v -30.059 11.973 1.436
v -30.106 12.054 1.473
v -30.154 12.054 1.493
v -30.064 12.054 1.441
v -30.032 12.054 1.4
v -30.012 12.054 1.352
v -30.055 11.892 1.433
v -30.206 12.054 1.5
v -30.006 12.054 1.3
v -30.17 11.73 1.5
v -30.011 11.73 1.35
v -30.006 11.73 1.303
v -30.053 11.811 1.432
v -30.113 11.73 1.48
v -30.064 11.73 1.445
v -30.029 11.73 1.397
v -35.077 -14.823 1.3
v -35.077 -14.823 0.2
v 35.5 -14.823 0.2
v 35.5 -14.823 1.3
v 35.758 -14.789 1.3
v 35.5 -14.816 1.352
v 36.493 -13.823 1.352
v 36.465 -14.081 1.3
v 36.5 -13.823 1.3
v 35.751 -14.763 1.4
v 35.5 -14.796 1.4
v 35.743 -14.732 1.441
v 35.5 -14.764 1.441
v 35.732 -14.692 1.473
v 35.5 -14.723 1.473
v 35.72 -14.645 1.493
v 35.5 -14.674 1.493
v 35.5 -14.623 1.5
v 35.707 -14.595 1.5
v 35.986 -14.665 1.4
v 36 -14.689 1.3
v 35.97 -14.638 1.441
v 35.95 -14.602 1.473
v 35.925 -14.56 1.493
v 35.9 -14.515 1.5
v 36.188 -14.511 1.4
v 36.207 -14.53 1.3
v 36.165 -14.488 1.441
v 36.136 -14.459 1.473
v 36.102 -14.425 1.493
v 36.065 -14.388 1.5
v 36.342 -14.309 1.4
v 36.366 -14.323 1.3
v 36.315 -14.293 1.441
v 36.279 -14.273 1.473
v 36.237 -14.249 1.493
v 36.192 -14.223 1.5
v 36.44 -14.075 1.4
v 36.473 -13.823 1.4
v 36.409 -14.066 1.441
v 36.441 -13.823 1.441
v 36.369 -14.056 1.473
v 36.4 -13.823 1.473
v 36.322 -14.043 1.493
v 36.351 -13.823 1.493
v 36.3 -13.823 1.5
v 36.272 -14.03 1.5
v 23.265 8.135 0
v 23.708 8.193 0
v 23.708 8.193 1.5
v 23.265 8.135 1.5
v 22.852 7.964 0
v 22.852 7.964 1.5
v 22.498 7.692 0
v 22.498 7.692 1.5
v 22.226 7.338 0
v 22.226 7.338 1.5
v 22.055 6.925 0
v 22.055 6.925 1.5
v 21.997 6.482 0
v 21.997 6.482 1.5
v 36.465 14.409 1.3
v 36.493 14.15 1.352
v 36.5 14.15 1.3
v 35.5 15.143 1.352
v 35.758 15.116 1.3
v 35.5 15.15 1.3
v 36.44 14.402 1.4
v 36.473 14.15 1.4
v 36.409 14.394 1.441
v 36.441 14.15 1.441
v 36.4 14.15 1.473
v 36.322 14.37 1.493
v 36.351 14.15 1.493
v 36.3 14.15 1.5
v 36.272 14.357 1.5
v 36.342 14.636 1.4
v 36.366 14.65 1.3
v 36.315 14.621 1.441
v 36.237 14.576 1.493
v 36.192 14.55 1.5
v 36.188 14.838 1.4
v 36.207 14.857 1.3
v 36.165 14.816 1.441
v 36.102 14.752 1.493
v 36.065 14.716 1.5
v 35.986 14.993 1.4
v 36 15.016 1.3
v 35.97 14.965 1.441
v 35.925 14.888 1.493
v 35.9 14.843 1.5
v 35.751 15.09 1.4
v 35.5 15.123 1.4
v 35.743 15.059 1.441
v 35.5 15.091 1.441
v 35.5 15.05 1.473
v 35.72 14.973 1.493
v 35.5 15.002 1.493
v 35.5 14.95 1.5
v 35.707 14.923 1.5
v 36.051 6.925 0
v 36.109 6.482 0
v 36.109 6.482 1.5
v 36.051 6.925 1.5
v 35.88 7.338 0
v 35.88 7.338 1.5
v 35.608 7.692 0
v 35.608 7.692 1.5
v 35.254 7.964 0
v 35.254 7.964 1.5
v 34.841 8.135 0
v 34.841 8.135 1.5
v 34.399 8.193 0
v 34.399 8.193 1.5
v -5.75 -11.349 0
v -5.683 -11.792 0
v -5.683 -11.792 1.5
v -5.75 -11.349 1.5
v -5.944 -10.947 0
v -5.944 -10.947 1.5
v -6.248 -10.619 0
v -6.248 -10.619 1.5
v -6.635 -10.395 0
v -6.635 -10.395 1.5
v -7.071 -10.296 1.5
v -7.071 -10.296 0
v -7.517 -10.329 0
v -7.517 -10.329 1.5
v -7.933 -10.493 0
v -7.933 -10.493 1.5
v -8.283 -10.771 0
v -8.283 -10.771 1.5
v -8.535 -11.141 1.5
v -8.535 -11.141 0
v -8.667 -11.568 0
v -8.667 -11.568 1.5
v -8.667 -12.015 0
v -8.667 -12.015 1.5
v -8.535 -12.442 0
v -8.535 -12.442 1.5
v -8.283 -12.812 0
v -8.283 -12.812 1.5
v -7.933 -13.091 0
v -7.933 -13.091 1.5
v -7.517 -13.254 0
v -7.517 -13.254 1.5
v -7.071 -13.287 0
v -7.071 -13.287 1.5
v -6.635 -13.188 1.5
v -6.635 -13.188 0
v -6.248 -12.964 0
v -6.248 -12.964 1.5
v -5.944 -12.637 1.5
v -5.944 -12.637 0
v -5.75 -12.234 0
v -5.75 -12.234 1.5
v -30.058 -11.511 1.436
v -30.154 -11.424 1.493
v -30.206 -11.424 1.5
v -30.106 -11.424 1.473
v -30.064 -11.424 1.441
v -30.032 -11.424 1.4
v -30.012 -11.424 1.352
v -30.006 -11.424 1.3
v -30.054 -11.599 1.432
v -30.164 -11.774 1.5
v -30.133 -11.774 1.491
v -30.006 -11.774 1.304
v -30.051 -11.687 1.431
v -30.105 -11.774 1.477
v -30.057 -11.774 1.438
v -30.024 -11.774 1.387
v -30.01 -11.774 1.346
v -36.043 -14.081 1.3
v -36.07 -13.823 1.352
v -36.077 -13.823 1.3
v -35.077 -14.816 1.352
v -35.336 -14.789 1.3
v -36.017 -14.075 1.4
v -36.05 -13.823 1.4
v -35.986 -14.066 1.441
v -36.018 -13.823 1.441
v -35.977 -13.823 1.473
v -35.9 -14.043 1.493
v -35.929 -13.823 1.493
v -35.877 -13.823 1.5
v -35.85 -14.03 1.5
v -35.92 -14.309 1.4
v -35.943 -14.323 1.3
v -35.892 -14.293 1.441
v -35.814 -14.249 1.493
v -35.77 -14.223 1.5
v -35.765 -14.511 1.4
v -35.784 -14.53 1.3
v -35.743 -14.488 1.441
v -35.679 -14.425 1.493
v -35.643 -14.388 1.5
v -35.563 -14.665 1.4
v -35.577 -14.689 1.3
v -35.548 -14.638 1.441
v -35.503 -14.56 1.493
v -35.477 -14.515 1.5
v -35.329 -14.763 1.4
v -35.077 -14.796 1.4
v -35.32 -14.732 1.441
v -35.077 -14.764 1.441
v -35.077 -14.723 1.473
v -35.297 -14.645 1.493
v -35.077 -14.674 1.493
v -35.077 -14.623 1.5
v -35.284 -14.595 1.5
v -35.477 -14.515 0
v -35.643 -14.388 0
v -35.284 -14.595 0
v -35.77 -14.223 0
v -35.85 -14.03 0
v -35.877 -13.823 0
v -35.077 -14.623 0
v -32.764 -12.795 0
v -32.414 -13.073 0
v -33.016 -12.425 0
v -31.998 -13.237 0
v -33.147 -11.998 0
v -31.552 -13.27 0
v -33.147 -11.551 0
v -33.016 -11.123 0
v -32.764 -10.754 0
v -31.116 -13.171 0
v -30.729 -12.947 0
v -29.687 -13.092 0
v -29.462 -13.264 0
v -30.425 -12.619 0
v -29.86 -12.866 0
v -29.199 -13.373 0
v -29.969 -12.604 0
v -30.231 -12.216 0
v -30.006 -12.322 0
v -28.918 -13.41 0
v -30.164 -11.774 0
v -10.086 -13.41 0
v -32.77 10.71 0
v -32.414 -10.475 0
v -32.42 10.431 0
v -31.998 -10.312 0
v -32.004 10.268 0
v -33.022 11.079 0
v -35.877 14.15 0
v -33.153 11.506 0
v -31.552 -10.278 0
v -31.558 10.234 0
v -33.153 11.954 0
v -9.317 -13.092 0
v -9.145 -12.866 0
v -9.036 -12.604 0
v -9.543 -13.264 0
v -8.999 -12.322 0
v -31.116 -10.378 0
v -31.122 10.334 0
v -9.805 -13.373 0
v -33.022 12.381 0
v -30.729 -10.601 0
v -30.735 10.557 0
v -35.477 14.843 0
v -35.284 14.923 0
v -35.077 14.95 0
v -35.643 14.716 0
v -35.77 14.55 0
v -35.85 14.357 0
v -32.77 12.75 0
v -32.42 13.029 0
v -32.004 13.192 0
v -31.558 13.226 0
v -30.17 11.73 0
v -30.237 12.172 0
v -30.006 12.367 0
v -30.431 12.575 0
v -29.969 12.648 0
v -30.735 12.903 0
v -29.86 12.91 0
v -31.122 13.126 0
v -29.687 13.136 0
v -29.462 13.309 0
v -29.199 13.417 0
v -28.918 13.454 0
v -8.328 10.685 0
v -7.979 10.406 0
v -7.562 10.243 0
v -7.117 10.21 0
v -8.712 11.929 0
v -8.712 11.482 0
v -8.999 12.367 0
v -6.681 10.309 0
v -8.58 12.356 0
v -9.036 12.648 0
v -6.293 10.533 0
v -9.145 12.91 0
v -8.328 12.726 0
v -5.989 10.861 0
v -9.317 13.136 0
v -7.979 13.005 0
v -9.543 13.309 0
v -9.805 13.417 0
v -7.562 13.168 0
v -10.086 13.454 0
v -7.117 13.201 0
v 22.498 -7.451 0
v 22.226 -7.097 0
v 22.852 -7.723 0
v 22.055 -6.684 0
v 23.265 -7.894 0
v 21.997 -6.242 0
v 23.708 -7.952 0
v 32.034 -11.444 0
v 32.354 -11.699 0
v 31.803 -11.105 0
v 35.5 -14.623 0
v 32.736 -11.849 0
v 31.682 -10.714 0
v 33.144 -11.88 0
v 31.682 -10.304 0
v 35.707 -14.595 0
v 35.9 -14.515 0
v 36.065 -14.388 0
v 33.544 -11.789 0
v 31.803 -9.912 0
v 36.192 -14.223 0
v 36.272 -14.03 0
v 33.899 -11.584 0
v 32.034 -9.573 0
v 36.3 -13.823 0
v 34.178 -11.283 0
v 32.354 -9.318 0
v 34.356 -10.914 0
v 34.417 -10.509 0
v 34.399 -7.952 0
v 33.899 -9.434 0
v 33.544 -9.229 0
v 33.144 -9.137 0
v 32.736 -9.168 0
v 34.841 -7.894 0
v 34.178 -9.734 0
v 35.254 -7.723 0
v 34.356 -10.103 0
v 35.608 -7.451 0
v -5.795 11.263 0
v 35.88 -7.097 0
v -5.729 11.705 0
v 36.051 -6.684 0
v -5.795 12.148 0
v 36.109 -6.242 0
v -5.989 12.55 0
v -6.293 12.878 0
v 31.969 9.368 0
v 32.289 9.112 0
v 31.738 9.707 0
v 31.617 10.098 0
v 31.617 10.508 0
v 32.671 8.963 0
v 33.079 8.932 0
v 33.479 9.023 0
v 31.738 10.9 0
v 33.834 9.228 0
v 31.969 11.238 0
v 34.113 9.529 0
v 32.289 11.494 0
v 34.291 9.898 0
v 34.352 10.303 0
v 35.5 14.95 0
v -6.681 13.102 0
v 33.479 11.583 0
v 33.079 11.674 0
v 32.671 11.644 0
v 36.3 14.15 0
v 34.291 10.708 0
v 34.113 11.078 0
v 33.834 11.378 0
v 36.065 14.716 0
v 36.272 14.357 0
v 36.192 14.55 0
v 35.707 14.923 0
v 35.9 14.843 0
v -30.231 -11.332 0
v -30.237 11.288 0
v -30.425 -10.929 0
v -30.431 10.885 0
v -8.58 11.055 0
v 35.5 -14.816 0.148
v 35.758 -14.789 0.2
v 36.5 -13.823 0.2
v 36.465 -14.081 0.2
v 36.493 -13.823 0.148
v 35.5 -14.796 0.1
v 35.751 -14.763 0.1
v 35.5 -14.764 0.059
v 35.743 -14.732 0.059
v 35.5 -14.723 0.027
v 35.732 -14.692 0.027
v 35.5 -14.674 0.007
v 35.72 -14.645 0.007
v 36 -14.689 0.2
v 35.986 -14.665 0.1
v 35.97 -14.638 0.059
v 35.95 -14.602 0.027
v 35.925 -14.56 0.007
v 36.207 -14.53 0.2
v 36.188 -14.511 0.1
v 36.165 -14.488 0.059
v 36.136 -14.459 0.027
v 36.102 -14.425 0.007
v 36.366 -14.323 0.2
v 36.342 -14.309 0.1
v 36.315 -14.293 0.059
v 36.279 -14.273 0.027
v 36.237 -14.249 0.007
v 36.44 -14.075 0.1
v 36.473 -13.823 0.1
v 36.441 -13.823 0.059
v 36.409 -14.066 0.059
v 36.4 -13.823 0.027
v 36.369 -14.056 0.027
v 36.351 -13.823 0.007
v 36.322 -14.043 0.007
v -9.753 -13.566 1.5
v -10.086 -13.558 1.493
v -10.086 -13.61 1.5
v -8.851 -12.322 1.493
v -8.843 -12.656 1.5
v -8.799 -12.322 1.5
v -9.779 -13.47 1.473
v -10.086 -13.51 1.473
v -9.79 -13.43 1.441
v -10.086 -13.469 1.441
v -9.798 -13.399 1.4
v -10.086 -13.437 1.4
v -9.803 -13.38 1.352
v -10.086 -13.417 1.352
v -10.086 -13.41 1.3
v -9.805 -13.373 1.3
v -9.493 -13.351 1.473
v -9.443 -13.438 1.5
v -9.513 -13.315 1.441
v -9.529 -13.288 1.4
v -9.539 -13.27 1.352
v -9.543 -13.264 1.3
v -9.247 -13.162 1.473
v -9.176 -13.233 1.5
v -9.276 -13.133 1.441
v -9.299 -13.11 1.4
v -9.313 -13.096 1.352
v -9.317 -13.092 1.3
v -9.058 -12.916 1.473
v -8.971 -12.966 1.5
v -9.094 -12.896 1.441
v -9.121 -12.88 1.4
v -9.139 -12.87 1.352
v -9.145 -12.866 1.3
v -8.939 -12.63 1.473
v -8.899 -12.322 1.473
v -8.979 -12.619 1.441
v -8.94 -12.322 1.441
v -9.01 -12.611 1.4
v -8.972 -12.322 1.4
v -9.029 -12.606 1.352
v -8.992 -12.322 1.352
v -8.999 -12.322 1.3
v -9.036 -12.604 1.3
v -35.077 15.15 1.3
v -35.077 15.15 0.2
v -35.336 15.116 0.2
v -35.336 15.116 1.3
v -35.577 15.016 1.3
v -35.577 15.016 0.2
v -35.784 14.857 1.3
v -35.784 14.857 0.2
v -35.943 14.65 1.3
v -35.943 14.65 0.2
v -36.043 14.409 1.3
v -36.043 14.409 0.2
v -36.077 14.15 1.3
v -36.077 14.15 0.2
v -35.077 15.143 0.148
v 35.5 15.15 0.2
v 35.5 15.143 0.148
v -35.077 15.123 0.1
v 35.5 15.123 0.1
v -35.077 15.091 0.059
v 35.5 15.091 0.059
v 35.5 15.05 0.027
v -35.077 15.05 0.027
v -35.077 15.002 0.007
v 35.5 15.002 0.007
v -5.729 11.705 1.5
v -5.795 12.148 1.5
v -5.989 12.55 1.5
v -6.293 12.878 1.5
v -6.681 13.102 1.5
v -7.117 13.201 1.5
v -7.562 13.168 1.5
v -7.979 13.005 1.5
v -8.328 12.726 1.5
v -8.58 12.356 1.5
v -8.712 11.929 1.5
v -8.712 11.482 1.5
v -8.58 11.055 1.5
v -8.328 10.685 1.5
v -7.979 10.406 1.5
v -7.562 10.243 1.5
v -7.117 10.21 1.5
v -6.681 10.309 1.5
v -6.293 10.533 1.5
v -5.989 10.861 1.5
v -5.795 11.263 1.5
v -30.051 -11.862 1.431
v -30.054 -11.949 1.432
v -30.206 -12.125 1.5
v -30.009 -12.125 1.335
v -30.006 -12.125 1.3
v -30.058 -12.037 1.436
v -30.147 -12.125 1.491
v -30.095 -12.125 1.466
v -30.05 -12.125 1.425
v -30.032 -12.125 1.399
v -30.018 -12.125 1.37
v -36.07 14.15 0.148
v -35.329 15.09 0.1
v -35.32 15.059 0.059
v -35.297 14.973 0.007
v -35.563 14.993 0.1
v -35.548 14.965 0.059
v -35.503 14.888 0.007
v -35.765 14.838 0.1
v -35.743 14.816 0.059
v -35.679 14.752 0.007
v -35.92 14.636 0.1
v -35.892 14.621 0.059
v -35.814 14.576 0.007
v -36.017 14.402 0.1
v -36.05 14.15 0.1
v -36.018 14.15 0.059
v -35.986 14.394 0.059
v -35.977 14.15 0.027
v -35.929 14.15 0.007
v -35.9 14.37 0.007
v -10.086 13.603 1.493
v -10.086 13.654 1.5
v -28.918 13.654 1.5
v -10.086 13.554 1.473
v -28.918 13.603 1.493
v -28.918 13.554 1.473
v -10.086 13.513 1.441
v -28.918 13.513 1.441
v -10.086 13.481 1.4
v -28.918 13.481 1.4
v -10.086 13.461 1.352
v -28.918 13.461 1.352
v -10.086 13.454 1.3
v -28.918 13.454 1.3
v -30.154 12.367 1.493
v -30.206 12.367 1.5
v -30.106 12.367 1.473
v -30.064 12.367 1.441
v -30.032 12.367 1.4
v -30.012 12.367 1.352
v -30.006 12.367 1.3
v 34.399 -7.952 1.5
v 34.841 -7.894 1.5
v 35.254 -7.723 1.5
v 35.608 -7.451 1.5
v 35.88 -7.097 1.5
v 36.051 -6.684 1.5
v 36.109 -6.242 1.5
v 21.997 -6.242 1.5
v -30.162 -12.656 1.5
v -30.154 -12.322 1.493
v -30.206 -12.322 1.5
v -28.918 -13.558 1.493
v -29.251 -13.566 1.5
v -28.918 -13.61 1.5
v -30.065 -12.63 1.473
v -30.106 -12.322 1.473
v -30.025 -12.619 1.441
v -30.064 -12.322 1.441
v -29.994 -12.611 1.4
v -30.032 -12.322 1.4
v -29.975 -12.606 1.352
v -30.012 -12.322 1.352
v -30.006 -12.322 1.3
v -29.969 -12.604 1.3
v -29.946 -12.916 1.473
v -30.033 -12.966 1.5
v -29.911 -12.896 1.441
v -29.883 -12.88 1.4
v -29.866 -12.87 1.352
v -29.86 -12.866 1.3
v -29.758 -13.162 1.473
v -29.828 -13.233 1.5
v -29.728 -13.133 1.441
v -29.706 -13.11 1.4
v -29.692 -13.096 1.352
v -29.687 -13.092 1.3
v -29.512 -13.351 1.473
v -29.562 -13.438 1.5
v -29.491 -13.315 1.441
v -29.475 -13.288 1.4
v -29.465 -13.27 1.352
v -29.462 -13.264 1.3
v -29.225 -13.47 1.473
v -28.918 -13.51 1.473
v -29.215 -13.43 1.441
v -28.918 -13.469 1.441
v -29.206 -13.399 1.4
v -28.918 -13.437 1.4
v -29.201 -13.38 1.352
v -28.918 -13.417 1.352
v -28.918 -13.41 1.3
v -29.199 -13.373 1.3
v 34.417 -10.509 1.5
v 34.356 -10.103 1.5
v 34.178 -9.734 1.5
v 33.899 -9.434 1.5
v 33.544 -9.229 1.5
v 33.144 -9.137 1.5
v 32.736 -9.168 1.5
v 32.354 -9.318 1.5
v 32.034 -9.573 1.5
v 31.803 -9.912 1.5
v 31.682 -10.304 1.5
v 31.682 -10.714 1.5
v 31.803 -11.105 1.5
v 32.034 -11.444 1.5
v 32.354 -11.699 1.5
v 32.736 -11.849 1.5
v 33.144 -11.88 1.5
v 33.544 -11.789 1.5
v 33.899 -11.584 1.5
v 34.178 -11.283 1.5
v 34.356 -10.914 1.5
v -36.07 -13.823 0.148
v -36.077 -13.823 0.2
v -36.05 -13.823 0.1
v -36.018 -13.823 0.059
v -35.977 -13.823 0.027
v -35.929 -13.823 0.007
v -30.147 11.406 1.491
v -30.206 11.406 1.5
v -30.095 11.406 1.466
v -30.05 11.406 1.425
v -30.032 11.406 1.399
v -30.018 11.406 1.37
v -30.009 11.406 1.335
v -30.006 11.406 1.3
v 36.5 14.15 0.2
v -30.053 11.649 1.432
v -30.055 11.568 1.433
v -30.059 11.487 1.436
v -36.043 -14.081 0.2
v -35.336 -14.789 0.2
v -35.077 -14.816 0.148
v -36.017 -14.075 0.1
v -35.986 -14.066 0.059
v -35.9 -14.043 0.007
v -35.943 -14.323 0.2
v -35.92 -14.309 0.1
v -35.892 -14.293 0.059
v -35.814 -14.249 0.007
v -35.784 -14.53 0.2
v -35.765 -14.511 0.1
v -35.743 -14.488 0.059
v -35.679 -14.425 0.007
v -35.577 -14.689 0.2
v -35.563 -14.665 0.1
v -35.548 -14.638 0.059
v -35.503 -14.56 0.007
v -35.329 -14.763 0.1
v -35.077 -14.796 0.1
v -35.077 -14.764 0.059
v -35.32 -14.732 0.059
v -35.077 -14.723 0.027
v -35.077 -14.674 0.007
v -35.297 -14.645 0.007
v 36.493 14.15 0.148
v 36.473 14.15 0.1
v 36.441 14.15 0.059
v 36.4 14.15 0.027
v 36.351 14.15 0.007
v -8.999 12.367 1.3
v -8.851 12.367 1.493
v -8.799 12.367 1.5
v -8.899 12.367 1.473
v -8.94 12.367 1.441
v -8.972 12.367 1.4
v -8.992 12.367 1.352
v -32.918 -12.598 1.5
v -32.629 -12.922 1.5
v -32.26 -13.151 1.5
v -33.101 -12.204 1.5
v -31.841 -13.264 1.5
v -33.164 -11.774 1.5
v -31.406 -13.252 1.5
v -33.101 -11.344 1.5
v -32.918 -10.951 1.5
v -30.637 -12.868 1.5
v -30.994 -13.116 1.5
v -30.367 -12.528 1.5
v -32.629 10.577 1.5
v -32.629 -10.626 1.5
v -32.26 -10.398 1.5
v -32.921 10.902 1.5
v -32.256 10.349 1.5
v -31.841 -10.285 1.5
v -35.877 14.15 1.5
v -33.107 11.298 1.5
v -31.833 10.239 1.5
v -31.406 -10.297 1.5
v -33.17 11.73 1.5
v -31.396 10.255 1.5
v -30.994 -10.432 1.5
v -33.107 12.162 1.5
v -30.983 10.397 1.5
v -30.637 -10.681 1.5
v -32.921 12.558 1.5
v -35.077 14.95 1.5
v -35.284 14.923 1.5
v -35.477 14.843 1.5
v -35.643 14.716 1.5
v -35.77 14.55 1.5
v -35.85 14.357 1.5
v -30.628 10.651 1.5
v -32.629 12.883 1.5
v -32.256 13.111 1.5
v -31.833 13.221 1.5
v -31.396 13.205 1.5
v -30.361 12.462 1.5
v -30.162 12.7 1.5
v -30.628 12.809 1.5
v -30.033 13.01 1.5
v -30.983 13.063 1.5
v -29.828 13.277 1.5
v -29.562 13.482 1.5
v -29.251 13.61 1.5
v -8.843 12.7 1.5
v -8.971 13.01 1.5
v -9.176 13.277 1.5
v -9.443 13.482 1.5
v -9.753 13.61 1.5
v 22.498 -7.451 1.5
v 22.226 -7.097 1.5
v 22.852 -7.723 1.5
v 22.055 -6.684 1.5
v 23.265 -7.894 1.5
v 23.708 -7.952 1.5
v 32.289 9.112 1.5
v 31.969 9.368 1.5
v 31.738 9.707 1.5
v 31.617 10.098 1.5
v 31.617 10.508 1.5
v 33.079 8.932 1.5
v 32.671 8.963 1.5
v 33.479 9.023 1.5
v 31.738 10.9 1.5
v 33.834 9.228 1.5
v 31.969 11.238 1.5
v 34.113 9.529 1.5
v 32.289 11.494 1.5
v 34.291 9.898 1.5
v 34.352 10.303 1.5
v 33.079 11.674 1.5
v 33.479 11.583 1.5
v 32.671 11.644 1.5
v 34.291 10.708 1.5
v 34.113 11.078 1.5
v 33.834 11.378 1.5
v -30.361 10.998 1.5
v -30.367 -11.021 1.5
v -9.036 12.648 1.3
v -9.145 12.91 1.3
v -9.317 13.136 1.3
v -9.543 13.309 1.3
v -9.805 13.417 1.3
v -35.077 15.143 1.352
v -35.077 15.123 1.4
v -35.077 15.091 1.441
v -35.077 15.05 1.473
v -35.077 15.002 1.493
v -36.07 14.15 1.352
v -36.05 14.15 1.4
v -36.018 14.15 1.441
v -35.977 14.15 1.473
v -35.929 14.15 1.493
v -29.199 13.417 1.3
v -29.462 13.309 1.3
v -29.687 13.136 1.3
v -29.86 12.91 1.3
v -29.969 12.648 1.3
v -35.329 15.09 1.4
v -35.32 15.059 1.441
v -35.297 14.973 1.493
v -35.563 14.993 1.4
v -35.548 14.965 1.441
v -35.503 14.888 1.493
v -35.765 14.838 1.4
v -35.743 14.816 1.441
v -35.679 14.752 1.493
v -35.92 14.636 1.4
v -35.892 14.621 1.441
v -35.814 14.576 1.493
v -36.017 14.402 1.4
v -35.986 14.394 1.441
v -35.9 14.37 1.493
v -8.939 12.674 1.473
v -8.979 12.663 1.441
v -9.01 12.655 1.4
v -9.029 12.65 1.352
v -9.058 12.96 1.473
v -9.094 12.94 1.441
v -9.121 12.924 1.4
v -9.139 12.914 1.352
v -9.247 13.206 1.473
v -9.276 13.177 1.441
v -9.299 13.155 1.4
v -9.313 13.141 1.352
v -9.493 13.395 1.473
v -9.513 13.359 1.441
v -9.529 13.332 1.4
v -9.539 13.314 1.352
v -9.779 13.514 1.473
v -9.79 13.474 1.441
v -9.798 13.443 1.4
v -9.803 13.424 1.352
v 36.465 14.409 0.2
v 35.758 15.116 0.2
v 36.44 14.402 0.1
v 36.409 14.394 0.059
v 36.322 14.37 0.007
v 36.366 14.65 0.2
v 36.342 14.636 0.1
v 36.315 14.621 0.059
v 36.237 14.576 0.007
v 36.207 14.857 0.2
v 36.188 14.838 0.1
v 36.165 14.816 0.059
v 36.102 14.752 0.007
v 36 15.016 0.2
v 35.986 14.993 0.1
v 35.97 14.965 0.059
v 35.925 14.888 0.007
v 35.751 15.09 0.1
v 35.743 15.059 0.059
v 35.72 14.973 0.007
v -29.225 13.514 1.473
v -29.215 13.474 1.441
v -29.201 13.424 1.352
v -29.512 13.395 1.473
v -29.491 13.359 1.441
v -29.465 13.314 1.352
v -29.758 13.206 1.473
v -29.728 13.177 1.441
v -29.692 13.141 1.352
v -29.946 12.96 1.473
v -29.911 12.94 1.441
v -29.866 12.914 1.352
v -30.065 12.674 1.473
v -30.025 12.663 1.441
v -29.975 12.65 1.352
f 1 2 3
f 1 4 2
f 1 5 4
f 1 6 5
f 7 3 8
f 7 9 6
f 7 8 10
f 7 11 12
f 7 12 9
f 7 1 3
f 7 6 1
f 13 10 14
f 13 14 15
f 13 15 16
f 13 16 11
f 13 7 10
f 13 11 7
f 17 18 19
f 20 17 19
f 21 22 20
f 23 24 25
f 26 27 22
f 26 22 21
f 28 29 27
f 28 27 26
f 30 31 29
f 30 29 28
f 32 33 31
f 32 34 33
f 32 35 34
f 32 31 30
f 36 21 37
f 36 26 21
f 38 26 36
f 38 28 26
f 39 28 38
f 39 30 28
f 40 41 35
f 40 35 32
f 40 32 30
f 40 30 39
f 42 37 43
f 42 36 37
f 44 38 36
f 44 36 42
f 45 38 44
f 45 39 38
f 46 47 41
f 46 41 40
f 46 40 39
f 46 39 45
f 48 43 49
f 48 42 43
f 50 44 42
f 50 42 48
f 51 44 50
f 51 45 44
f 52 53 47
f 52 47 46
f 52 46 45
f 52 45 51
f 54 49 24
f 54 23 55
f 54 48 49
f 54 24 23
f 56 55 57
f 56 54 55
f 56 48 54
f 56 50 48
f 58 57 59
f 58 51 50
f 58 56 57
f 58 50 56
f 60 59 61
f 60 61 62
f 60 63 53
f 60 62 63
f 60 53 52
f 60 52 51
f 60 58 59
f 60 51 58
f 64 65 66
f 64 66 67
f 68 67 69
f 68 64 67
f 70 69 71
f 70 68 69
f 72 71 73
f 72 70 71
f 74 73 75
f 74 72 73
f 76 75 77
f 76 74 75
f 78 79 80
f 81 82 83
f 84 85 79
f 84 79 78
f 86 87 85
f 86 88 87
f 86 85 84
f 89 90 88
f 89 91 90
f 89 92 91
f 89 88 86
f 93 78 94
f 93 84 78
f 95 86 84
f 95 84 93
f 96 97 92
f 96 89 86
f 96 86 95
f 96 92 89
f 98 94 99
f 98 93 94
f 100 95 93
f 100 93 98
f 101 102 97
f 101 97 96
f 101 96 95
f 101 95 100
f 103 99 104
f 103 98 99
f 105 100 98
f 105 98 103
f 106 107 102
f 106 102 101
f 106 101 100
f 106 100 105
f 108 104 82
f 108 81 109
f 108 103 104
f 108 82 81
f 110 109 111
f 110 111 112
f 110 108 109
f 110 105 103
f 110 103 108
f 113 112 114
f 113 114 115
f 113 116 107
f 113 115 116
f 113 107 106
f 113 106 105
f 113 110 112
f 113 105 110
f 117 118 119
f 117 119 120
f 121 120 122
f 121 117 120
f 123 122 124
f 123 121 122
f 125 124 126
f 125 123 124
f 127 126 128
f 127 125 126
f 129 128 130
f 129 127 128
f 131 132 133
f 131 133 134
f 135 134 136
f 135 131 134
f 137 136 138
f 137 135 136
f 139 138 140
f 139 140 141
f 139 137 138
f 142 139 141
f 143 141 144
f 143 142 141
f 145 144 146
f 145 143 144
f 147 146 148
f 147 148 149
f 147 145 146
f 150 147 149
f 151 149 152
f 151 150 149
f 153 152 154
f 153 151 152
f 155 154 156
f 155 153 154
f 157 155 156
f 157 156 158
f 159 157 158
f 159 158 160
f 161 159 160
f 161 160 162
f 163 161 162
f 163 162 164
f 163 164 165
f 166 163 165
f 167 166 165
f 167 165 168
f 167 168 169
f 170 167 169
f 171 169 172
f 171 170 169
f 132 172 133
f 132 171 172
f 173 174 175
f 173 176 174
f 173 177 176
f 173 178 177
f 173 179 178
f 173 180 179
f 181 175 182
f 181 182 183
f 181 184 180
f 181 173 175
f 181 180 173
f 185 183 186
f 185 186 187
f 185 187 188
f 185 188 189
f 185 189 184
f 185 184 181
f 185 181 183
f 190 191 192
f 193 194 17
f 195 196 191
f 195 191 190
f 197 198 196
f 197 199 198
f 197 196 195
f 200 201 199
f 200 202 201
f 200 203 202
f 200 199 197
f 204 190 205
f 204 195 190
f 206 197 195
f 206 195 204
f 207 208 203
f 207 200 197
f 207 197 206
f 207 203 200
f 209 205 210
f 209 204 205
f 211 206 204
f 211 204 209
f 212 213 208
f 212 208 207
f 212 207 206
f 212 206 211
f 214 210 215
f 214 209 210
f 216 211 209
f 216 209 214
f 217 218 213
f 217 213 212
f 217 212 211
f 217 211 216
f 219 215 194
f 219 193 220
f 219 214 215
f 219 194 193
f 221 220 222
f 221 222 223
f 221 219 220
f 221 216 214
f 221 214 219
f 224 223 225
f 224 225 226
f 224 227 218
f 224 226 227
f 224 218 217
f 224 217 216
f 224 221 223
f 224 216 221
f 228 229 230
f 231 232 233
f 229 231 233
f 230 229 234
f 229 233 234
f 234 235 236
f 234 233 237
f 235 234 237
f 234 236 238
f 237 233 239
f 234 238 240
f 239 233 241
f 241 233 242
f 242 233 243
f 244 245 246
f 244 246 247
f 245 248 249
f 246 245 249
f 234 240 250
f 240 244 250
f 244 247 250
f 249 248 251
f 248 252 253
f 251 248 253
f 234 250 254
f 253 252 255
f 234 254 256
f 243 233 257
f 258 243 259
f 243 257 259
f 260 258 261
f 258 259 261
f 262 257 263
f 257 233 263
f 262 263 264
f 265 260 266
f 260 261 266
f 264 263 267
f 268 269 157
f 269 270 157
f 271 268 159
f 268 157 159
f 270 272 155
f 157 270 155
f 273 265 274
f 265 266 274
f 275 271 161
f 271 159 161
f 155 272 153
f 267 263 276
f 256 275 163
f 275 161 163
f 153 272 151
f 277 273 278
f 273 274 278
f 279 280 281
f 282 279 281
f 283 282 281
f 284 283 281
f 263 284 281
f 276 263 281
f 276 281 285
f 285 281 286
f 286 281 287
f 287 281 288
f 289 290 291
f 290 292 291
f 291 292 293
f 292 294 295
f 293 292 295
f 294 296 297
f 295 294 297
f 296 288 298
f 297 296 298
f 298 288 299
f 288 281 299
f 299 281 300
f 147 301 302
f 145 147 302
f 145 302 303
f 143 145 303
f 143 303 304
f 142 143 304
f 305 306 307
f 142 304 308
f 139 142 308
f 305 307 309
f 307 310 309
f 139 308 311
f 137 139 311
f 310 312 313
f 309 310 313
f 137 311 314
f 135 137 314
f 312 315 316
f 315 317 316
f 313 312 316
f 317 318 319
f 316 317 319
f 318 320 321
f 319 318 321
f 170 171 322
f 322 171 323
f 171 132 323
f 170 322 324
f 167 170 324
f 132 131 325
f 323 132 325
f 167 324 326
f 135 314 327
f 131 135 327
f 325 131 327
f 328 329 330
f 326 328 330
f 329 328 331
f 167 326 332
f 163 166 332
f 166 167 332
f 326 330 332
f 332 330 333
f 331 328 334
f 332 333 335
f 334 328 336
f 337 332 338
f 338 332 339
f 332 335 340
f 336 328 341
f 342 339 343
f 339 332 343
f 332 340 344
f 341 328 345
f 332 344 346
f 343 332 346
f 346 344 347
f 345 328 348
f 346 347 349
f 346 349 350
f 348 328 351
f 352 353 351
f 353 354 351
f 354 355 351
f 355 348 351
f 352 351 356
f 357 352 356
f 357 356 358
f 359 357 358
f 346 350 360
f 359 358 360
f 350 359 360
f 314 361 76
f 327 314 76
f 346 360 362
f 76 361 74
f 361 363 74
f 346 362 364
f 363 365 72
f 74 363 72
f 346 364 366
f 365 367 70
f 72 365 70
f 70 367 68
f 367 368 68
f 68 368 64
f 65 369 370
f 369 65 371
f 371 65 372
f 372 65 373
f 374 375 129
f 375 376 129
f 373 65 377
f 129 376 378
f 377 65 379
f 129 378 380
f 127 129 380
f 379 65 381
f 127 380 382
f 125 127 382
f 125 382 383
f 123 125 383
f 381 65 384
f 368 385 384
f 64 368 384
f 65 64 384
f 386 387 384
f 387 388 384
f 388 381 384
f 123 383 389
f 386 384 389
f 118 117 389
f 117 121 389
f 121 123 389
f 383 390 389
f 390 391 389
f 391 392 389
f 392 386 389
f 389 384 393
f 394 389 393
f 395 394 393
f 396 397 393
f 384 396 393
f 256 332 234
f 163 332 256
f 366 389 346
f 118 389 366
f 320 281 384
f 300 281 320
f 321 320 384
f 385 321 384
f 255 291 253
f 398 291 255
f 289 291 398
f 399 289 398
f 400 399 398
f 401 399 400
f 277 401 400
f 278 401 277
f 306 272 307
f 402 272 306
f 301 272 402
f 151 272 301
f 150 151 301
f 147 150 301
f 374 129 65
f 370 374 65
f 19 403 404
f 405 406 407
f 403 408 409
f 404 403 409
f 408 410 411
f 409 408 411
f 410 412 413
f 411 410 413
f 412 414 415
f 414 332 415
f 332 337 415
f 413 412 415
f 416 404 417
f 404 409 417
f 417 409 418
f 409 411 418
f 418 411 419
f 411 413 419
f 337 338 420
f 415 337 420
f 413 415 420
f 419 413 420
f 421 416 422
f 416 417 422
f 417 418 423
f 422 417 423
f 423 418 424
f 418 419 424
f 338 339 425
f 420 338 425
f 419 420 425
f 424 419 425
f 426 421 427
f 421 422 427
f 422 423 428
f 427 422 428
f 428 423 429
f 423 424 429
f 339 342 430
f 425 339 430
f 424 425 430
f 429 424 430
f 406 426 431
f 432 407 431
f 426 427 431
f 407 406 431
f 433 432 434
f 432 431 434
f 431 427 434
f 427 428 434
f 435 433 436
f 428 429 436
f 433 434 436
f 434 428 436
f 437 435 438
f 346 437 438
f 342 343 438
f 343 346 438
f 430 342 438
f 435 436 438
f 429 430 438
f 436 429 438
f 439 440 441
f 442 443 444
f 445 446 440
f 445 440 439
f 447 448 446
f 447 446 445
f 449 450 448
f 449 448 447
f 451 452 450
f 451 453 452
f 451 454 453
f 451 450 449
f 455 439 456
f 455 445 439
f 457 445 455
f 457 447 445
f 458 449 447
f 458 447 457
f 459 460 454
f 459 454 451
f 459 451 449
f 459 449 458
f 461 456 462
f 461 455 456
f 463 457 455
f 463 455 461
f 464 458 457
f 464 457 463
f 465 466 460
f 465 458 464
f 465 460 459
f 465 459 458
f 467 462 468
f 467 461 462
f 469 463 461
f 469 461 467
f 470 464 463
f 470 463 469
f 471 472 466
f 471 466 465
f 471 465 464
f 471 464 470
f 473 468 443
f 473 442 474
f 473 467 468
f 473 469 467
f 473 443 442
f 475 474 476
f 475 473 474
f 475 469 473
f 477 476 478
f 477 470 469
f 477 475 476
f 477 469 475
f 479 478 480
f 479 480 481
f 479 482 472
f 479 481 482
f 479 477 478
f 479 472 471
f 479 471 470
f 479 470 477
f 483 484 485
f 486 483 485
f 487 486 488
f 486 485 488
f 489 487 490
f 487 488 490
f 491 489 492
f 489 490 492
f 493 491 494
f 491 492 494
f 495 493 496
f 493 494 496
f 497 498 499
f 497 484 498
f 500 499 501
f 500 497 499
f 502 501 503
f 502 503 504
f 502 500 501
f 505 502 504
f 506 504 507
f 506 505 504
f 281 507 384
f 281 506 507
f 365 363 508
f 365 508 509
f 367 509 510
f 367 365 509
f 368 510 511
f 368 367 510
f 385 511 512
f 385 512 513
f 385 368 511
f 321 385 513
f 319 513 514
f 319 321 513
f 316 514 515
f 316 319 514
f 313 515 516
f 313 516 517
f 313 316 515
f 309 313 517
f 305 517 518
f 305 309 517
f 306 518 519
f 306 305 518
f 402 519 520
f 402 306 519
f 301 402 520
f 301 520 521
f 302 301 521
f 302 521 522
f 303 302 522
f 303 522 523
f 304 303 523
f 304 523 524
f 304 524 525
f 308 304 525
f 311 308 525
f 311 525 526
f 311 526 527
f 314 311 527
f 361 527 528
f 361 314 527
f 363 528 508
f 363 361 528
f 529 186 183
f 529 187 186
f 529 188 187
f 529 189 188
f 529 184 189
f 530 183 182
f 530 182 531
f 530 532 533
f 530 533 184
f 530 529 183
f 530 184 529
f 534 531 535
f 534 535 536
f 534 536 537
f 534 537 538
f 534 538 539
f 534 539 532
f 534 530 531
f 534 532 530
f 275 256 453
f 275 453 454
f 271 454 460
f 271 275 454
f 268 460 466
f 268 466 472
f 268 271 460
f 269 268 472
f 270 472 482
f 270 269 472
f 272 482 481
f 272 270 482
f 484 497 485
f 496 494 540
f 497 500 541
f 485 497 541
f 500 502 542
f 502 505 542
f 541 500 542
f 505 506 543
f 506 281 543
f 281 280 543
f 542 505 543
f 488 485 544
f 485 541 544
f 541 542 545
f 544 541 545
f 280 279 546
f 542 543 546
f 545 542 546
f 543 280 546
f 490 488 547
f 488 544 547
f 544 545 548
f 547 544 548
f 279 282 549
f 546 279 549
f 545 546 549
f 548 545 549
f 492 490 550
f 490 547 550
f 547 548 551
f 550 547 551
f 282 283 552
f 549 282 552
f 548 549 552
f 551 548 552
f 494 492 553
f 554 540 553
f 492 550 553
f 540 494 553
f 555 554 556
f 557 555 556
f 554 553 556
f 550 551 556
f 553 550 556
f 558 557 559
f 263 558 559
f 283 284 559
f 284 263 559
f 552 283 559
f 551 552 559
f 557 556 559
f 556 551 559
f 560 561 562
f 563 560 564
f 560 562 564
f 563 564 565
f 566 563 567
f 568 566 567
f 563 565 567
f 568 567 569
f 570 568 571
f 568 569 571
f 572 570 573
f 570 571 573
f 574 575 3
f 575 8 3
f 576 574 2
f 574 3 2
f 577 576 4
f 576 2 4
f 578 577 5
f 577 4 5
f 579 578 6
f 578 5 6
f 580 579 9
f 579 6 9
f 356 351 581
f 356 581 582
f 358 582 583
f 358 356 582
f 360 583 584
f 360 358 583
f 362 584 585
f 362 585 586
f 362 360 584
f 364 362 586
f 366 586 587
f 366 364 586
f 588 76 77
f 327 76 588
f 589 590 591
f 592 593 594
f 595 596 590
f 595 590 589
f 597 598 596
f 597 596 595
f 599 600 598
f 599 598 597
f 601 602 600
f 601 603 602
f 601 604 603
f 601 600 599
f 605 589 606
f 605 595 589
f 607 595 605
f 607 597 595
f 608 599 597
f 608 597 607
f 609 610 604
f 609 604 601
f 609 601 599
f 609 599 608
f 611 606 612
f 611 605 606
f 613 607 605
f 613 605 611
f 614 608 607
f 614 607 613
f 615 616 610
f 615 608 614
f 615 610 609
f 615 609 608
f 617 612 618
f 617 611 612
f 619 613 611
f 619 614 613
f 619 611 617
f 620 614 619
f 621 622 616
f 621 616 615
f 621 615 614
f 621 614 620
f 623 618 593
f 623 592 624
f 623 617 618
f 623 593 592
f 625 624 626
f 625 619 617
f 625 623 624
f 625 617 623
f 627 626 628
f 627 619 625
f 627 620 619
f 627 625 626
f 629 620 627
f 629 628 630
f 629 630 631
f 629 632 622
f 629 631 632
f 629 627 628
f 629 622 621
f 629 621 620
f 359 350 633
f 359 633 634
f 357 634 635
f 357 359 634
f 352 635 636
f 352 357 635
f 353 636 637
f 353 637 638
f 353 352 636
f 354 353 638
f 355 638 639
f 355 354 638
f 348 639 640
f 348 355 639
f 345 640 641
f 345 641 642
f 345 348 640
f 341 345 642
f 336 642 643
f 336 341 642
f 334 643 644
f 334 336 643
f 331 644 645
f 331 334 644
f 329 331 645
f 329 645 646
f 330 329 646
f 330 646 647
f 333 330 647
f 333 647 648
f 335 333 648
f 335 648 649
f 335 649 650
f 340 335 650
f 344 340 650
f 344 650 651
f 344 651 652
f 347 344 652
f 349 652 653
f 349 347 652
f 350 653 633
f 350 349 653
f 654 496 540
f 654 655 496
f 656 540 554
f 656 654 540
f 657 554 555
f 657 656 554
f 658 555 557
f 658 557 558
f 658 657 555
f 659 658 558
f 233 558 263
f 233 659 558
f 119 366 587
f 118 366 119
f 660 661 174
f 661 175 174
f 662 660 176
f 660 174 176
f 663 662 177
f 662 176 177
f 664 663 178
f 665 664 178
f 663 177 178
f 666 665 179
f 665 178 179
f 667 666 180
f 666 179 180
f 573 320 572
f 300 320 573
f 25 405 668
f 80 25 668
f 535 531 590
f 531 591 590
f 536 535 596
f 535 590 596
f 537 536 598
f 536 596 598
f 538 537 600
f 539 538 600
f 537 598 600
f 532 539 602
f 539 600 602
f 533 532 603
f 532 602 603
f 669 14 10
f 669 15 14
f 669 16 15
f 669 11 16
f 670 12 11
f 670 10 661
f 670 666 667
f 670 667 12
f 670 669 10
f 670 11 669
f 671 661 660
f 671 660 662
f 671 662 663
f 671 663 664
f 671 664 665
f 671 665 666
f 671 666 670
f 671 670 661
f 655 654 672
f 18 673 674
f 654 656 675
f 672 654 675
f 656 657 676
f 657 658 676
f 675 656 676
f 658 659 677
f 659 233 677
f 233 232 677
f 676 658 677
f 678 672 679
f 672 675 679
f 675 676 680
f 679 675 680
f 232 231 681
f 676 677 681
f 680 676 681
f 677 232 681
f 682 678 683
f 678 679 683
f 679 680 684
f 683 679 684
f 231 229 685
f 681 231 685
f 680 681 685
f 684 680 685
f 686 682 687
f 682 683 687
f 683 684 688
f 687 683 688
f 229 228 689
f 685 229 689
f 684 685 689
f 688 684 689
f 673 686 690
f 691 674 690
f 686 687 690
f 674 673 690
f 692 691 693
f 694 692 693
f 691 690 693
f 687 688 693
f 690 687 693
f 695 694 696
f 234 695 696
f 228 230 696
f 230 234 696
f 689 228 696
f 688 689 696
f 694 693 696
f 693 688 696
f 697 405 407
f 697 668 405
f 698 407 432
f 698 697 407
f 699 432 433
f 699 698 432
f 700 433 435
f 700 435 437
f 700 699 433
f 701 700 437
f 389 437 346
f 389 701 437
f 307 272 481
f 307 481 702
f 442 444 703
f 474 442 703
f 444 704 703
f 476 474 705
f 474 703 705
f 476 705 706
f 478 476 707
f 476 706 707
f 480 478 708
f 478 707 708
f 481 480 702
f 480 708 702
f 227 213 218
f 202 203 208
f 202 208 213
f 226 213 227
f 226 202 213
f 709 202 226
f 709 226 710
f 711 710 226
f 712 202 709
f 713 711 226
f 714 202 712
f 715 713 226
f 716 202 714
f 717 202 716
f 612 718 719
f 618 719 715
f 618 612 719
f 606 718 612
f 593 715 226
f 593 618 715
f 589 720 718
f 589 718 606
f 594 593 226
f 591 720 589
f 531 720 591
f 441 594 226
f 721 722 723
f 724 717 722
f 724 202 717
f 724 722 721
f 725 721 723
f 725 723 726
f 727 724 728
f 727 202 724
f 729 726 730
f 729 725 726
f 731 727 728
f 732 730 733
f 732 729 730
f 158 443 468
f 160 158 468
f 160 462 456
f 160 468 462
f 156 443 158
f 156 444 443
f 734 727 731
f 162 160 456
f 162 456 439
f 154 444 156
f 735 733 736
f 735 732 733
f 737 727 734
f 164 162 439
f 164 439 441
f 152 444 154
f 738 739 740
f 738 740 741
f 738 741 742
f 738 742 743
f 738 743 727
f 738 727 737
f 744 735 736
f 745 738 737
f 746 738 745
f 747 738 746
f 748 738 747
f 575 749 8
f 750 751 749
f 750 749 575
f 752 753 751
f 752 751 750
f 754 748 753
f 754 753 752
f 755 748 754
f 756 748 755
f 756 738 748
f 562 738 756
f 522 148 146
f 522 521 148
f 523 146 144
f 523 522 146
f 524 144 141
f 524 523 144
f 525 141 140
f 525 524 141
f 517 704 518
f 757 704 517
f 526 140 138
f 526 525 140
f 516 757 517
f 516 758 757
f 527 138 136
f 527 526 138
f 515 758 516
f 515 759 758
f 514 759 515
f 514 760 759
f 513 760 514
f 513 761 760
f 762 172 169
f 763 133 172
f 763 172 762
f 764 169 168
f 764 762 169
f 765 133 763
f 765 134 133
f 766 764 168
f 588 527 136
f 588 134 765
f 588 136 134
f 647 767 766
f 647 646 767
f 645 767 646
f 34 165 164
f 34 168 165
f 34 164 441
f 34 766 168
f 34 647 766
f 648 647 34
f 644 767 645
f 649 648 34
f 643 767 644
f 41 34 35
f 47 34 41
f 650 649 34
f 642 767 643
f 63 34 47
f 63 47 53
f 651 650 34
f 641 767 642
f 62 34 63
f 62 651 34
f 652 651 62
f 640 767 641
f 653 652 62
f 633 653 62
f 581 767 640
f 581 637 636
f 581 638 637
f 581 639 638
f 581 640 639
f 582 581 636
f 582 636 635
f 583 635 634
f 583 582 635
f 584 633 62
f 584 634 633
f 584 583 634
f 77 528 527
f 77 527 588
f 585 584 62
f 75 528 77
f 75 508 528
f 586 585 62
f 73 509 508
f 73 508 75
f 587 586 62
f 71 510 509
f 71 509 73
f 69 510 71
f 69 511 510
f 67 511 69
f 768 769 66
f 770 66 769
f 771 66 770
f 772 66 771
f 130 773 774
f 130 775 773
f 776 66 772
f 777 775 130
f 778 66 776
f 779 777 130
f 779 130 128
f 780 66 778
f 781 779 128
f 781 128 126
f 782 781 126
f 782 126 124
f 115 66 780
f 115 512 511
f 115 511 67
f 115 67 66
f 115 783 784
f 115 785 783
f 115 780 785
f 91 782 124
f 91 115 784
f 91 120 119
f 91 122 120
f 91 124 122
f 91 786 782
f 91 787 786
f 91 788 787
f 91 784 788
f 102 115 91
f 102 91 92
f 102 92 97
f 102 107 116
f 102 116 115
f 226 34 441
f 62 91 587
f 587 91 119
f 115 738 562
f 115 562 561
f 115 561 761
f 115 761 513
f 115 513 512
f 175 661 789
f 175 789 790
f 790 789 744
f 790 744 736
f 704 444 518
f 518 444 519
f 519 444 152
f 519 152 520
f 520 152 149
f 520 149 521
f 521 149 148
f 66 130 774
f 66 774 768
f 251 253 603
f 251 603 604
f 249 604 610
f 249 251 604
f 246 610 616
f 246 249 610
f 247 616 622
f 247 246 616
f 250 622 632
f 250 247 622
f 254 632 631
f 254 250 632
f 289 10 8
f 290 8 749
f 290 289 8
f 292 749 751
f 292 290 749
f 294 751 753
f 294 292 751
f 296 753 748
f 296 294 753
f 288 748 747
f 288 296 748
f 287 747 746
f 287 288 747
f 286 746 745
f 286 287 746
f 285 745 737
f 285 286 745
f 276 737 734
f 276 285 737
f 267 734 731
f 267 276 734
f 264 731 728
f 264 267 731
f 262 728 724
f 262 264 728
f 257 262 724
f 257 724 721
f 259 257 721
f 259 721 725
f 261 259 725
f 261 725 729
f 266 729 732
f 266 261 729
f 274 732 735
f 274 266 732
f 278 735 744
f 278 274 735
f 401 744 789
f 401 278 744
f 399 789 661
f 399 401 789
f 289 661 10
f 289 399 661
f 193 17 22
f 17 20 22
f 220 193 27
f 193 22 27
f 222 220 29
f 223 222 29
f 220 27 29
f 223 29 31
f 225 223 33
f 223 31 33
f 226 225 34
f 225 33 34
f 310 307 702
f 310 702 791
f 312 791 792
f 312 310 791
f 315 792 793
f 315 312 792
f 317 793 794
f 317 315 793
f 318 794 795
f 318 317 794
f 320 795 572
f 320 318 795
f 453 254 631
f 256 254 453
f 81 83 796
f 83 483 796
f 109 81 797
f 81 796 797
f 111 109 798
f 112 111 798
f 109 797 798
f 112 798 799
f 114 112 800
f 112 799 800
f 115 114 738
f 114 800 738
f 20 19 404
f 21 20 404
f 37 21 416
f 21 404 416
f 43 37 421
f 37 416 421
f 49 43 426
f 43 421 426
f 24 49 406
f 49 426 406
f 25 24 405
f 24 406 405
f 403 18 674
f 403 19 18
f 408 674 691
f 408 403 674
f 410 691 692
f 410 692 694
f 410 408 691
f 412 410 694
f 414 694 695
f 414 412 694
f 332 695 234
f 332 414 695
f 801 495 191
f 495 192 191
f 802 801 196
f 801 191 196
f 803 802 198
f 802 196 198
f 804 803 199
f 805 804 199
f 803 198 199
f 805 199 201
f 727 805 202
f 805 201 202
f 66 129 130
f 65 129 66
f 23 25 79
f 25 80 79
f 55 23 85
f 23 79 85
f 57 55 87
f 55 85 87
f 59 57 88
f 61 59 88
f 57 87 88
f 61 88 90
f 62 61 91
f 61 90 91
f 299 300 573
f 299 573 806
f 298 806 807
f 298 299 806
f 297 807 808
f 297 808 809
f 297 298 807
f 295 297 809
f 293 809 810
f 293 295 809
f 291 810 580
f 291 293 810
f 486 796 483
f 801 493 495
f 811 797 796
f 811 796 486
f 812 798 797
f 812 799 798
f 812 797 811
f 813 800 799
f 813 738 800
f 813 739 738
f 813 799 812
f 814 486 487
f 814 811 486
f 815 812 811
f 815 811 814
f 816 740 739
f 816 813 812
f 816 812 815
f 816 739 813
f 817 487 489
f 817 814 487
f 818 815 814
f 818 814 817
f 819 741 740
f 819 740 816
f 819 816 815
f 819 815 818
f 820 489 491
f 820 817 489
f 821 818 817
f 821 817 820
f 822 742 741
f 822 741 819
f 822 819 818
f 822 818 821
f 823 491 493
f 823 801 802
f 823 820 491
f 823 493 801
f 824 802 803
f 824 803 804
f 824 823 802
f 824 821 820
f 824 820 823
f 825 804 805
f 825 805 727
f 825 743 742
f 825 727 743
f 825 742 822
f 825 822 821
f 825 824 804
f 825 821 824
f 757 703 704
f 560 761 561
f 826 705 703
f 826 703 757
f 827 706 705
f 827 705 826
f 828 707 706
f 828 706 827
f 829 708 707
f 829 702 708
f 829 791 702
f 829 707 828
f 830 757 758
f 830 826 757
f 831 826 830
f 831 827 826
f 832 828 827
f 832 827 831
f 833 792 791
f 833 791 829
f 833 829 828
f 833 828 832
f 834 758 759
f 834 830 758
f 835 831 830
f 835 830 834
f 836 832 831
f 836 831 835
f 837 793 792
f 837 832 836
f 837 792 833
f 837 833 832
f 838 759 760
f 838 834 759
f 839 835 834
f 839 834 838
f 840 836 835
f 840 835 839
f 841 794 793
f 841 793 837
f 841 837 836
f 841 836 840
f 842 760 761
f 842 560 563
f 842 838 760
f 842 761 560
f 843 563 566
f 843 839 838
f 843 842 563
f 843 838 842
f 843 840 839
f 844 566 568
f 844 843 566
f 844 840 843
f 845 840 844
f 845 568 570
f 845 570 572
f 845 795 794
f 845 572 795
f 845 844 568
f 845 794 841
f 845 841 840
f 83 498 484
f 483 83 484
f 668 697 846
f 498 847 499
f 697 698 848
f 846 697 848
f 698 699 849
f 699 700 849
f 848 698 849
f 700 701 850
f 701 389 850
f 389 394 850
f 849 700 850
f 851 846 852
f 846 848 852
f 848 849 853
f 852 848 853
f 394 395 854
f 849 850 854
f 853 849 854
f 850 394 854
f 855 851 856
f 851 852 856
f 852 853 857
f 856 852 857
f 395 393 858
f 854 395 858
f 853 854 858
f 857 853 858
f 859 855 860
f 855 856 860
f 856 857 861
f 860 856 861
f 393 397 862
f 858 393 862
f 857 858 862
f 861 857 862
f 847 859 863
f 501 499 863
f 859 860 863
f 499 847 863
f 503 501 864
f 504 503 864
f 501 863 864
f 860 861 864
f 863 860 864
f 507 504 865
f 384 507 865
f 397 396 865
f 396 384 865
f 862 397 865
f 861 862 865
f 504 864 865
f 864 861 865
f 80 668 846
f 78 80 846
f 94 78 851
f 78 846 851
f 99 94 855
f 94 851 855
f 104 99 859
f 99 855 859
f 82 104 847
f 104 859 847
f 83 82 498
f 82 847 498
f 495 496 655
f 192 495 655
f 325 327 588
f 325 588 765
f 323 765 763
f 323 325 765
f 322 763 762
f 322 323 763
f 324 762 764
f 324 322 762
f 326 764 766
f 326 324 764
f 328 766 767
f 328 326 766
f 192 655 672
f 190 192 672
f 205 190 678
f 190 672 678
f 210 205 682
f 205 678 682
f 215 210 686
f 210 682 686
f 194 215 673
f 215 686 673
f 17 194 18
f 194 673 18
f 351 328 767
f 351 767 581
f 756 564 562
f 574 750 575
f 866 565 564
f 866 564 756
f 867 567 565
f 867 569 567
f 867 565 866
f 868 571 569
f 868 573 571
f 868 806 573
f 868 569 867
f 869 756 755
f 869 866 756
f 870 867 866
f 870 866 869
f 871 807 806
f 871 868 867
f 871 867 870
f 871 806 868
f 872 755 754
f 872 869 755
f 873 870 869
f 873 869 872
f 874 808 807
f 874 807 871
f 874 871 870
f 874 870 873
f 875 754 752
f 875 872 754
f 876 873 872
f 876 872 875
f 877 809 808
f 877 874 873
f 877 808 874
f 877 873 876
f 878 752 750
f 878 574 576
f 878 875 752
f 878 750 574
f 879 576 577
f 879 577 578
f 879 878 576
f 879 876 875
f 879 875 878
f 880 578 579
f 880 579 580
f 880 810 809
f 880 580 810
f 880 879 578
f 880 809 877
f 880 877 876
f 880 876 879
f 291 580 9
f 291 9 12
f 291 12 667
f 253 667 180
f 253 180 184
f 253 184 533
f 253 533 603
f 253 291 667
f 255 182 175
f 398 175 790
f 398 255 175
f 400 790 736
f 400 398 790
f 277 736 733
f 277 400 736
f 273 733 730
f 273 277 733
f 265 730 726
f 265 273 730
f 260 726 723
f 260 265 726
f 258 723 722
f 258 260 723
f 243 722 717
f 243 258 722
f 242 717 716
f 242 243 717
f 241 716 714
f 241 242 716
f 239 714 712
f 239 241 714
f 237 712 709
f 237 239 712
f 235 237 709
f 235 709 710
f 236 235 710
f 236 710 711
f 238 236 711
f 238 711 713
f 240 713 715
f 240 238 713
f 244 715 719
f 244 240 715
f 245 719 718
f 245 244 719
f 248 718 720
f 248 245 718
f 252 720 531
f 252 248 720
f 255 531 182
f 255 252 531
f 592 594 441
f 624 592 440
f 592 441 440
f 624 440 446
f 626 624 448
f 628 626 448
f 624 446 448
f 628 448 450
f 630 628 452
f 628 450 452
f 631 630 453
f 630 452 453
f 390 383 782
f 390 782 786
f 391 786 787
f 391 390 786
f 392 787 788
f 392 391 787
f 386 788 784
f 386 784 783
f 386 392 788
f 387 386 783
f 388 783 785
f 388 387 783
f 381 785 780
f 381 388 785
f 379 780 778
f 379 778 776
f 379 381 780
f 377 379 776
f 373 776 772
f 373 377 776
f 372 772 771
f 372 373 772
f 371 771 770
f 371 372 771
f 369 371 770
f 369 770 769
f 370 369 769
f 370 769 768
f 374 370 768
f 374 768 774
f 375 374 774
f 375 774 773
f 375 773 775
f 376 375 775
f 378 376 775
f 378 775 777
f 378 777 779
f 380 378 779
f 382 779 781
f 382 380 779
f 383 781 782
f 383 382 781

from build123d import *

# Parameters (mm, degrees)
SKETCH001_R   = 1.5
SKETCH001_R_2 = 1.375
PAD001_DEPTH  = 1.5
FILLET001_R   = 0.2
FILLET002_R   = 0.2
FILLET003_R   = 0.2


with BuildPart() as part:
    # Sketch001 → Pad001 (new body)
    with BuildSketch(Plane.XY):
        with BuildLine():
            Line((-35.07682, -14.822674), (35.499554, -14.822674))
            ThreePointArc((35.499554, -14.822674), (36.206661, -14.529781), (36.499554, -13.822674))
            Line((36.499554, -13.822674), (36.499554, 14.149868))
            ThreePointArc((36.499554, 14.149868), (36.206661, 14.856975), (35.499554, 15.149868))
            Line((35.499554, 15.149868), (-35.07682, 15.149868))
            ThreePointArc((-35.07682, 15.149868), (-35.783927, 14.856975), (-36.07682, 14.149868))
            Line((-36.07682, 14.149868), (-36.07682, -13.822674))
            ThreePointArc((-36.07682, -13.822674), (-35.783927, -14.529781), (-35.07682, -14.822674))
        make_face()
        with Locations((-31.664087, -11.774244)):
            Circle(SKETCH001_R, mode=Mode.SUBTRACT)
        with Locations((-31.670164, 11.730007)):
            Circle(SKETCH001_R, mode=Mode.SUBTRACT)
        with Locations((-7.183492, -11.791598)):
            Circle(SKETCH001_R, mode=Mode.SUBTRACT)
        with Locations((-7.228608, 11.705488)):
            Circle(SKETCH001_R, mode=Mode.SUBTRACT)
        with Locations((32.976643, 10.303188)):
            Circle(SKETCH001_R_2, mode=Mode.SUBTRACT)
        with Locations((33.041733, -10.508623)):
            Circle(SKETCH001_R_2, mode=Mode.SUBTRACT)
        with BuildLine():
            Line((34.398702, 8.193074), (23.707742, 8.193074))
            ThreePointArc((23.707742, 8.193074), (22.498043, 7.692), (21.996969, 6.482301))
            Line((21.996969, 6.482301), (21.996969, -6.241538))
            ThreePointArc((21.996969, -6.241538), (22.498043, -7.451237), (23.707742, -7.95231))
            Line((23.707742, -7.95231), (34.398702, -7.95231))
            ThreePointArc((34.398702, -7.95231), (35.608401, -7.451237), (36.109474, -6.241538))
            Line((36.109474, -6.241538), (36.109474, 6.482301))
            ThreePointArc((36.109474, 6.482301), (35.608401, 7.692), (34.398702, 8.193074))
        make_face(mode=Mode.SUBTRACT)
        with BuildLine():
            Line((-30.005591, 12.366703), (-30.005591, -12.32248))
            ThreePointArc((-30.005591, -12.32248), (-29.687046, -13.091518), (-28.918008, -13.410063))
            Line((-28.918008, -13.410063), (-10.086485, -13.410063))
            ThreePointArc((-10.086485, -13.410063), (-9.317448, -13.091518), (-8.998902, -12.32248))
            Line((-8.998902, -12.32248), (-8.998902, 12.366703))
            ThreePointArc((-8.998902, 12.366703), (-9.317448, 13.13574), (-10.086485, 13.454286))
            Line((-10.086485, 13.454286), (-28.918008, 13.454286))
            ThreePointArc((-28.918008, 13.454286), (-29.687046, 13.13574), (-30.005591, 12.366703))
        make_face(mode=Mode.SUBTRACT)
    extrude(amount=PAD001_DEPTH)

    # Fillet001
    fillet001_edges = [part.edges().sort_by_distance(p)[0] for p in [
        (0.211367, -14.822674, 1.5),
    ]]
    fillet(fillet001_edges, radius=FILLET001_R)

    # Fillet002
    fillet002_edges = [part.edges().sort_by_distance(p)[0] for p in [
        (0.211367, -14.822674, 0),
    ]]
    fillet(fillet002_edges, radius=FILLET002_R)

    # Fillet003
    fillet003_edges = [part.edges().sort_by_distance(p)[0] for p in [
        (-30.005591, 0.022111, 1.5),
    ]]
    fillet(fillet003_edges, radius=FILLET003_R)


solid = part.part
